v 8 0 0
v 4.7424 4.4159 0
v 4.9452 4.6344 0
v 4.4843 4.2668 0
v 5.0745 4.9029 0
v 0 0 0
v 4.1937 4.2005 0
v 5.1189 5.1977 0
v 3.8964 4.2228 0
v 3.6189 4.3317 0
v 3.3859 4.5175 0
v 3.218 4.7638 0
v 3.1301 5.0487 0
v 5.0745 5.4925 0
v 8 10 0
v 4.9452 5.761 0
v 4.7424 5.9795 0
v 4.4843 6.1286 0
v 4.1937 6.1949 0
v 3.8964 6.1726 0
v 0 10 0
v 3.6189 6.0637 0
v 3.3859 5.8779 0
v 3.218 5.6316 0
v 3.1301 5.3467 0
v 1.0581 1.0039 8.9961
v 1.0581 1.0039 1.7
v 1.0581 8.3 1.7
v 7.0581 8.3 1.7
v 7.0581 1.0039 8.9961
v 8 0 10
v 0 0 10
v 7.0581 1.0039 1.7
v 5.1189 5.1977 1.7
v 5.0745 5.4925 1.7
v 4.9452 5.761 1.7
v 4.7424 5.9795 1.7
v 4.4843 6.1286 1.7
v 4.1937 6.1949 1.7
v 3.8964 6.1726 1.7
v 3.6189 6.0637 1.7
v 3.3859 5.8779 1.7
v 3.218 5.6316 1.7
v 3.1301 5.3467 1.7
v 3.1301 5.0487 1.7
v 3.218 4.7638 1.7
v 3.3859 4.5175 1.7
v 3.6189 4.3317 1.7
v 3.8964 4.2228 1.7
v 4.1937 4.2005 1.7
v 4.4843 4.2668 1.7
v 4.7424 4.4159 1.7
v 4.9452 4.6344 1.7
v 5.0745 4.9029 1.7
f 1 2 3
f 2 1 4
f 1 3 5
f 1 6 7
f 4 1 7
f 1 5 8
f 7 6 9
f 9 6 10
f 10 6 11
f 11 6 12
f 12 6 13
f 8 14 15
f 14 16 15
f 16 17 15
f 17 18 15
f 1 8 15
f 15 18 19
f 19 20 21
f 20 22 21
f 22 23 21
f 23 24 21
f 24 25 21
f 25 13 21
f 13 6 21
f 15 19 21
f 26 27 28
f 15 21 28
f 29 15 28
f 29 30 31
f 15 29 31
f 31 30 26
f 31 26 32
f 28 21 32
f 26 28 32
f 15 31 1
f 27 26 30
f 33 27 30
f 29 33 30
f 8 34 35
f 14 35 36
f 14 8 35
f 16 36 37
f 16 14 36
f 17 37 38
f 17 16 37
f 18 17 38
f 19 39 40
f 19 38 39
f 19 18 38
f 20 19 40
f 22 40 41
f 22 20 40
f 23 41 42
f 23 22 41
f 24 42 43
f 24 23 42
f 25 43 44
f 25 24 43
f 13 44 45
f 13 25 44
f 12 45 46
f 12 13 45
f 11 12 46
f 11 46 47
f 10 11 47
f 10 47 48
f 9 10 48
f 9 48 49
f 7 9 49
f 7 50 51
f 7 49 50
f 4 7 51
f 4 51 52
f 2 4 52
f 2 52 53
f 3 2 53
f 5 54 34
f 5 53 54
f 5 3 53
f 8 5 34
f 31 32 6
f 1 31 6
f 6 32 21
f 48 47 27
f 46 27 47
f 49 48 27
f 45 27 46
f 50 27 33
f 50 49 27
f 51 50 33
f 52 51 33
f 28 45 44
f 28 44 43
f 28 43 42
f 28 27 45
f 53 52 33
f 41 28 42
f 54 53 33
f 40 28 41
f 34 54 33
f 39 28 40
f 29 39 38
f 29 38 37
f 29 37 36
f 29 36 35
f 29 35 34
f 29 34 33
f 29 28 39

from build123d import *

# Parameters (mm, degrees)
F1_DEPTH = 8
F3_START = 1.7
F2_W     = 6
F2_H     = 9
F3_DEPTH = 20.7
F4_R     = 1
F5_DEPTH = 19.8


with BuildPart() as f1:
    # F0 (on Right) → F1 (new body)
    with BuildSketch(Plane.YZ):
        Polygon((0, 10), (0, 0), (10, 0), align=None)
    extrude(amount=F1_DEPTH)

    # F2 (on Top) → F3 (cut)
    with BuildSketch(Plane.XY.offset(F3_START)):
        with Locations((4.0581296198, 5.5038969816)):
            Rectangle(F2_W, F2_H)
    extrude(amount=F3_DEPTH, mode=Mode.SUBTRACT)

    # F4 (on Top) → F5 (cut)
    with BuildSketch(Plane.XY):
        with Locations((4.1189291514, 5.1976959221)):
            Circle(F4_R)
    extrude(amount=F5_DEPTH, mode=Mode.SUBTRACT)


solid = f1.part
